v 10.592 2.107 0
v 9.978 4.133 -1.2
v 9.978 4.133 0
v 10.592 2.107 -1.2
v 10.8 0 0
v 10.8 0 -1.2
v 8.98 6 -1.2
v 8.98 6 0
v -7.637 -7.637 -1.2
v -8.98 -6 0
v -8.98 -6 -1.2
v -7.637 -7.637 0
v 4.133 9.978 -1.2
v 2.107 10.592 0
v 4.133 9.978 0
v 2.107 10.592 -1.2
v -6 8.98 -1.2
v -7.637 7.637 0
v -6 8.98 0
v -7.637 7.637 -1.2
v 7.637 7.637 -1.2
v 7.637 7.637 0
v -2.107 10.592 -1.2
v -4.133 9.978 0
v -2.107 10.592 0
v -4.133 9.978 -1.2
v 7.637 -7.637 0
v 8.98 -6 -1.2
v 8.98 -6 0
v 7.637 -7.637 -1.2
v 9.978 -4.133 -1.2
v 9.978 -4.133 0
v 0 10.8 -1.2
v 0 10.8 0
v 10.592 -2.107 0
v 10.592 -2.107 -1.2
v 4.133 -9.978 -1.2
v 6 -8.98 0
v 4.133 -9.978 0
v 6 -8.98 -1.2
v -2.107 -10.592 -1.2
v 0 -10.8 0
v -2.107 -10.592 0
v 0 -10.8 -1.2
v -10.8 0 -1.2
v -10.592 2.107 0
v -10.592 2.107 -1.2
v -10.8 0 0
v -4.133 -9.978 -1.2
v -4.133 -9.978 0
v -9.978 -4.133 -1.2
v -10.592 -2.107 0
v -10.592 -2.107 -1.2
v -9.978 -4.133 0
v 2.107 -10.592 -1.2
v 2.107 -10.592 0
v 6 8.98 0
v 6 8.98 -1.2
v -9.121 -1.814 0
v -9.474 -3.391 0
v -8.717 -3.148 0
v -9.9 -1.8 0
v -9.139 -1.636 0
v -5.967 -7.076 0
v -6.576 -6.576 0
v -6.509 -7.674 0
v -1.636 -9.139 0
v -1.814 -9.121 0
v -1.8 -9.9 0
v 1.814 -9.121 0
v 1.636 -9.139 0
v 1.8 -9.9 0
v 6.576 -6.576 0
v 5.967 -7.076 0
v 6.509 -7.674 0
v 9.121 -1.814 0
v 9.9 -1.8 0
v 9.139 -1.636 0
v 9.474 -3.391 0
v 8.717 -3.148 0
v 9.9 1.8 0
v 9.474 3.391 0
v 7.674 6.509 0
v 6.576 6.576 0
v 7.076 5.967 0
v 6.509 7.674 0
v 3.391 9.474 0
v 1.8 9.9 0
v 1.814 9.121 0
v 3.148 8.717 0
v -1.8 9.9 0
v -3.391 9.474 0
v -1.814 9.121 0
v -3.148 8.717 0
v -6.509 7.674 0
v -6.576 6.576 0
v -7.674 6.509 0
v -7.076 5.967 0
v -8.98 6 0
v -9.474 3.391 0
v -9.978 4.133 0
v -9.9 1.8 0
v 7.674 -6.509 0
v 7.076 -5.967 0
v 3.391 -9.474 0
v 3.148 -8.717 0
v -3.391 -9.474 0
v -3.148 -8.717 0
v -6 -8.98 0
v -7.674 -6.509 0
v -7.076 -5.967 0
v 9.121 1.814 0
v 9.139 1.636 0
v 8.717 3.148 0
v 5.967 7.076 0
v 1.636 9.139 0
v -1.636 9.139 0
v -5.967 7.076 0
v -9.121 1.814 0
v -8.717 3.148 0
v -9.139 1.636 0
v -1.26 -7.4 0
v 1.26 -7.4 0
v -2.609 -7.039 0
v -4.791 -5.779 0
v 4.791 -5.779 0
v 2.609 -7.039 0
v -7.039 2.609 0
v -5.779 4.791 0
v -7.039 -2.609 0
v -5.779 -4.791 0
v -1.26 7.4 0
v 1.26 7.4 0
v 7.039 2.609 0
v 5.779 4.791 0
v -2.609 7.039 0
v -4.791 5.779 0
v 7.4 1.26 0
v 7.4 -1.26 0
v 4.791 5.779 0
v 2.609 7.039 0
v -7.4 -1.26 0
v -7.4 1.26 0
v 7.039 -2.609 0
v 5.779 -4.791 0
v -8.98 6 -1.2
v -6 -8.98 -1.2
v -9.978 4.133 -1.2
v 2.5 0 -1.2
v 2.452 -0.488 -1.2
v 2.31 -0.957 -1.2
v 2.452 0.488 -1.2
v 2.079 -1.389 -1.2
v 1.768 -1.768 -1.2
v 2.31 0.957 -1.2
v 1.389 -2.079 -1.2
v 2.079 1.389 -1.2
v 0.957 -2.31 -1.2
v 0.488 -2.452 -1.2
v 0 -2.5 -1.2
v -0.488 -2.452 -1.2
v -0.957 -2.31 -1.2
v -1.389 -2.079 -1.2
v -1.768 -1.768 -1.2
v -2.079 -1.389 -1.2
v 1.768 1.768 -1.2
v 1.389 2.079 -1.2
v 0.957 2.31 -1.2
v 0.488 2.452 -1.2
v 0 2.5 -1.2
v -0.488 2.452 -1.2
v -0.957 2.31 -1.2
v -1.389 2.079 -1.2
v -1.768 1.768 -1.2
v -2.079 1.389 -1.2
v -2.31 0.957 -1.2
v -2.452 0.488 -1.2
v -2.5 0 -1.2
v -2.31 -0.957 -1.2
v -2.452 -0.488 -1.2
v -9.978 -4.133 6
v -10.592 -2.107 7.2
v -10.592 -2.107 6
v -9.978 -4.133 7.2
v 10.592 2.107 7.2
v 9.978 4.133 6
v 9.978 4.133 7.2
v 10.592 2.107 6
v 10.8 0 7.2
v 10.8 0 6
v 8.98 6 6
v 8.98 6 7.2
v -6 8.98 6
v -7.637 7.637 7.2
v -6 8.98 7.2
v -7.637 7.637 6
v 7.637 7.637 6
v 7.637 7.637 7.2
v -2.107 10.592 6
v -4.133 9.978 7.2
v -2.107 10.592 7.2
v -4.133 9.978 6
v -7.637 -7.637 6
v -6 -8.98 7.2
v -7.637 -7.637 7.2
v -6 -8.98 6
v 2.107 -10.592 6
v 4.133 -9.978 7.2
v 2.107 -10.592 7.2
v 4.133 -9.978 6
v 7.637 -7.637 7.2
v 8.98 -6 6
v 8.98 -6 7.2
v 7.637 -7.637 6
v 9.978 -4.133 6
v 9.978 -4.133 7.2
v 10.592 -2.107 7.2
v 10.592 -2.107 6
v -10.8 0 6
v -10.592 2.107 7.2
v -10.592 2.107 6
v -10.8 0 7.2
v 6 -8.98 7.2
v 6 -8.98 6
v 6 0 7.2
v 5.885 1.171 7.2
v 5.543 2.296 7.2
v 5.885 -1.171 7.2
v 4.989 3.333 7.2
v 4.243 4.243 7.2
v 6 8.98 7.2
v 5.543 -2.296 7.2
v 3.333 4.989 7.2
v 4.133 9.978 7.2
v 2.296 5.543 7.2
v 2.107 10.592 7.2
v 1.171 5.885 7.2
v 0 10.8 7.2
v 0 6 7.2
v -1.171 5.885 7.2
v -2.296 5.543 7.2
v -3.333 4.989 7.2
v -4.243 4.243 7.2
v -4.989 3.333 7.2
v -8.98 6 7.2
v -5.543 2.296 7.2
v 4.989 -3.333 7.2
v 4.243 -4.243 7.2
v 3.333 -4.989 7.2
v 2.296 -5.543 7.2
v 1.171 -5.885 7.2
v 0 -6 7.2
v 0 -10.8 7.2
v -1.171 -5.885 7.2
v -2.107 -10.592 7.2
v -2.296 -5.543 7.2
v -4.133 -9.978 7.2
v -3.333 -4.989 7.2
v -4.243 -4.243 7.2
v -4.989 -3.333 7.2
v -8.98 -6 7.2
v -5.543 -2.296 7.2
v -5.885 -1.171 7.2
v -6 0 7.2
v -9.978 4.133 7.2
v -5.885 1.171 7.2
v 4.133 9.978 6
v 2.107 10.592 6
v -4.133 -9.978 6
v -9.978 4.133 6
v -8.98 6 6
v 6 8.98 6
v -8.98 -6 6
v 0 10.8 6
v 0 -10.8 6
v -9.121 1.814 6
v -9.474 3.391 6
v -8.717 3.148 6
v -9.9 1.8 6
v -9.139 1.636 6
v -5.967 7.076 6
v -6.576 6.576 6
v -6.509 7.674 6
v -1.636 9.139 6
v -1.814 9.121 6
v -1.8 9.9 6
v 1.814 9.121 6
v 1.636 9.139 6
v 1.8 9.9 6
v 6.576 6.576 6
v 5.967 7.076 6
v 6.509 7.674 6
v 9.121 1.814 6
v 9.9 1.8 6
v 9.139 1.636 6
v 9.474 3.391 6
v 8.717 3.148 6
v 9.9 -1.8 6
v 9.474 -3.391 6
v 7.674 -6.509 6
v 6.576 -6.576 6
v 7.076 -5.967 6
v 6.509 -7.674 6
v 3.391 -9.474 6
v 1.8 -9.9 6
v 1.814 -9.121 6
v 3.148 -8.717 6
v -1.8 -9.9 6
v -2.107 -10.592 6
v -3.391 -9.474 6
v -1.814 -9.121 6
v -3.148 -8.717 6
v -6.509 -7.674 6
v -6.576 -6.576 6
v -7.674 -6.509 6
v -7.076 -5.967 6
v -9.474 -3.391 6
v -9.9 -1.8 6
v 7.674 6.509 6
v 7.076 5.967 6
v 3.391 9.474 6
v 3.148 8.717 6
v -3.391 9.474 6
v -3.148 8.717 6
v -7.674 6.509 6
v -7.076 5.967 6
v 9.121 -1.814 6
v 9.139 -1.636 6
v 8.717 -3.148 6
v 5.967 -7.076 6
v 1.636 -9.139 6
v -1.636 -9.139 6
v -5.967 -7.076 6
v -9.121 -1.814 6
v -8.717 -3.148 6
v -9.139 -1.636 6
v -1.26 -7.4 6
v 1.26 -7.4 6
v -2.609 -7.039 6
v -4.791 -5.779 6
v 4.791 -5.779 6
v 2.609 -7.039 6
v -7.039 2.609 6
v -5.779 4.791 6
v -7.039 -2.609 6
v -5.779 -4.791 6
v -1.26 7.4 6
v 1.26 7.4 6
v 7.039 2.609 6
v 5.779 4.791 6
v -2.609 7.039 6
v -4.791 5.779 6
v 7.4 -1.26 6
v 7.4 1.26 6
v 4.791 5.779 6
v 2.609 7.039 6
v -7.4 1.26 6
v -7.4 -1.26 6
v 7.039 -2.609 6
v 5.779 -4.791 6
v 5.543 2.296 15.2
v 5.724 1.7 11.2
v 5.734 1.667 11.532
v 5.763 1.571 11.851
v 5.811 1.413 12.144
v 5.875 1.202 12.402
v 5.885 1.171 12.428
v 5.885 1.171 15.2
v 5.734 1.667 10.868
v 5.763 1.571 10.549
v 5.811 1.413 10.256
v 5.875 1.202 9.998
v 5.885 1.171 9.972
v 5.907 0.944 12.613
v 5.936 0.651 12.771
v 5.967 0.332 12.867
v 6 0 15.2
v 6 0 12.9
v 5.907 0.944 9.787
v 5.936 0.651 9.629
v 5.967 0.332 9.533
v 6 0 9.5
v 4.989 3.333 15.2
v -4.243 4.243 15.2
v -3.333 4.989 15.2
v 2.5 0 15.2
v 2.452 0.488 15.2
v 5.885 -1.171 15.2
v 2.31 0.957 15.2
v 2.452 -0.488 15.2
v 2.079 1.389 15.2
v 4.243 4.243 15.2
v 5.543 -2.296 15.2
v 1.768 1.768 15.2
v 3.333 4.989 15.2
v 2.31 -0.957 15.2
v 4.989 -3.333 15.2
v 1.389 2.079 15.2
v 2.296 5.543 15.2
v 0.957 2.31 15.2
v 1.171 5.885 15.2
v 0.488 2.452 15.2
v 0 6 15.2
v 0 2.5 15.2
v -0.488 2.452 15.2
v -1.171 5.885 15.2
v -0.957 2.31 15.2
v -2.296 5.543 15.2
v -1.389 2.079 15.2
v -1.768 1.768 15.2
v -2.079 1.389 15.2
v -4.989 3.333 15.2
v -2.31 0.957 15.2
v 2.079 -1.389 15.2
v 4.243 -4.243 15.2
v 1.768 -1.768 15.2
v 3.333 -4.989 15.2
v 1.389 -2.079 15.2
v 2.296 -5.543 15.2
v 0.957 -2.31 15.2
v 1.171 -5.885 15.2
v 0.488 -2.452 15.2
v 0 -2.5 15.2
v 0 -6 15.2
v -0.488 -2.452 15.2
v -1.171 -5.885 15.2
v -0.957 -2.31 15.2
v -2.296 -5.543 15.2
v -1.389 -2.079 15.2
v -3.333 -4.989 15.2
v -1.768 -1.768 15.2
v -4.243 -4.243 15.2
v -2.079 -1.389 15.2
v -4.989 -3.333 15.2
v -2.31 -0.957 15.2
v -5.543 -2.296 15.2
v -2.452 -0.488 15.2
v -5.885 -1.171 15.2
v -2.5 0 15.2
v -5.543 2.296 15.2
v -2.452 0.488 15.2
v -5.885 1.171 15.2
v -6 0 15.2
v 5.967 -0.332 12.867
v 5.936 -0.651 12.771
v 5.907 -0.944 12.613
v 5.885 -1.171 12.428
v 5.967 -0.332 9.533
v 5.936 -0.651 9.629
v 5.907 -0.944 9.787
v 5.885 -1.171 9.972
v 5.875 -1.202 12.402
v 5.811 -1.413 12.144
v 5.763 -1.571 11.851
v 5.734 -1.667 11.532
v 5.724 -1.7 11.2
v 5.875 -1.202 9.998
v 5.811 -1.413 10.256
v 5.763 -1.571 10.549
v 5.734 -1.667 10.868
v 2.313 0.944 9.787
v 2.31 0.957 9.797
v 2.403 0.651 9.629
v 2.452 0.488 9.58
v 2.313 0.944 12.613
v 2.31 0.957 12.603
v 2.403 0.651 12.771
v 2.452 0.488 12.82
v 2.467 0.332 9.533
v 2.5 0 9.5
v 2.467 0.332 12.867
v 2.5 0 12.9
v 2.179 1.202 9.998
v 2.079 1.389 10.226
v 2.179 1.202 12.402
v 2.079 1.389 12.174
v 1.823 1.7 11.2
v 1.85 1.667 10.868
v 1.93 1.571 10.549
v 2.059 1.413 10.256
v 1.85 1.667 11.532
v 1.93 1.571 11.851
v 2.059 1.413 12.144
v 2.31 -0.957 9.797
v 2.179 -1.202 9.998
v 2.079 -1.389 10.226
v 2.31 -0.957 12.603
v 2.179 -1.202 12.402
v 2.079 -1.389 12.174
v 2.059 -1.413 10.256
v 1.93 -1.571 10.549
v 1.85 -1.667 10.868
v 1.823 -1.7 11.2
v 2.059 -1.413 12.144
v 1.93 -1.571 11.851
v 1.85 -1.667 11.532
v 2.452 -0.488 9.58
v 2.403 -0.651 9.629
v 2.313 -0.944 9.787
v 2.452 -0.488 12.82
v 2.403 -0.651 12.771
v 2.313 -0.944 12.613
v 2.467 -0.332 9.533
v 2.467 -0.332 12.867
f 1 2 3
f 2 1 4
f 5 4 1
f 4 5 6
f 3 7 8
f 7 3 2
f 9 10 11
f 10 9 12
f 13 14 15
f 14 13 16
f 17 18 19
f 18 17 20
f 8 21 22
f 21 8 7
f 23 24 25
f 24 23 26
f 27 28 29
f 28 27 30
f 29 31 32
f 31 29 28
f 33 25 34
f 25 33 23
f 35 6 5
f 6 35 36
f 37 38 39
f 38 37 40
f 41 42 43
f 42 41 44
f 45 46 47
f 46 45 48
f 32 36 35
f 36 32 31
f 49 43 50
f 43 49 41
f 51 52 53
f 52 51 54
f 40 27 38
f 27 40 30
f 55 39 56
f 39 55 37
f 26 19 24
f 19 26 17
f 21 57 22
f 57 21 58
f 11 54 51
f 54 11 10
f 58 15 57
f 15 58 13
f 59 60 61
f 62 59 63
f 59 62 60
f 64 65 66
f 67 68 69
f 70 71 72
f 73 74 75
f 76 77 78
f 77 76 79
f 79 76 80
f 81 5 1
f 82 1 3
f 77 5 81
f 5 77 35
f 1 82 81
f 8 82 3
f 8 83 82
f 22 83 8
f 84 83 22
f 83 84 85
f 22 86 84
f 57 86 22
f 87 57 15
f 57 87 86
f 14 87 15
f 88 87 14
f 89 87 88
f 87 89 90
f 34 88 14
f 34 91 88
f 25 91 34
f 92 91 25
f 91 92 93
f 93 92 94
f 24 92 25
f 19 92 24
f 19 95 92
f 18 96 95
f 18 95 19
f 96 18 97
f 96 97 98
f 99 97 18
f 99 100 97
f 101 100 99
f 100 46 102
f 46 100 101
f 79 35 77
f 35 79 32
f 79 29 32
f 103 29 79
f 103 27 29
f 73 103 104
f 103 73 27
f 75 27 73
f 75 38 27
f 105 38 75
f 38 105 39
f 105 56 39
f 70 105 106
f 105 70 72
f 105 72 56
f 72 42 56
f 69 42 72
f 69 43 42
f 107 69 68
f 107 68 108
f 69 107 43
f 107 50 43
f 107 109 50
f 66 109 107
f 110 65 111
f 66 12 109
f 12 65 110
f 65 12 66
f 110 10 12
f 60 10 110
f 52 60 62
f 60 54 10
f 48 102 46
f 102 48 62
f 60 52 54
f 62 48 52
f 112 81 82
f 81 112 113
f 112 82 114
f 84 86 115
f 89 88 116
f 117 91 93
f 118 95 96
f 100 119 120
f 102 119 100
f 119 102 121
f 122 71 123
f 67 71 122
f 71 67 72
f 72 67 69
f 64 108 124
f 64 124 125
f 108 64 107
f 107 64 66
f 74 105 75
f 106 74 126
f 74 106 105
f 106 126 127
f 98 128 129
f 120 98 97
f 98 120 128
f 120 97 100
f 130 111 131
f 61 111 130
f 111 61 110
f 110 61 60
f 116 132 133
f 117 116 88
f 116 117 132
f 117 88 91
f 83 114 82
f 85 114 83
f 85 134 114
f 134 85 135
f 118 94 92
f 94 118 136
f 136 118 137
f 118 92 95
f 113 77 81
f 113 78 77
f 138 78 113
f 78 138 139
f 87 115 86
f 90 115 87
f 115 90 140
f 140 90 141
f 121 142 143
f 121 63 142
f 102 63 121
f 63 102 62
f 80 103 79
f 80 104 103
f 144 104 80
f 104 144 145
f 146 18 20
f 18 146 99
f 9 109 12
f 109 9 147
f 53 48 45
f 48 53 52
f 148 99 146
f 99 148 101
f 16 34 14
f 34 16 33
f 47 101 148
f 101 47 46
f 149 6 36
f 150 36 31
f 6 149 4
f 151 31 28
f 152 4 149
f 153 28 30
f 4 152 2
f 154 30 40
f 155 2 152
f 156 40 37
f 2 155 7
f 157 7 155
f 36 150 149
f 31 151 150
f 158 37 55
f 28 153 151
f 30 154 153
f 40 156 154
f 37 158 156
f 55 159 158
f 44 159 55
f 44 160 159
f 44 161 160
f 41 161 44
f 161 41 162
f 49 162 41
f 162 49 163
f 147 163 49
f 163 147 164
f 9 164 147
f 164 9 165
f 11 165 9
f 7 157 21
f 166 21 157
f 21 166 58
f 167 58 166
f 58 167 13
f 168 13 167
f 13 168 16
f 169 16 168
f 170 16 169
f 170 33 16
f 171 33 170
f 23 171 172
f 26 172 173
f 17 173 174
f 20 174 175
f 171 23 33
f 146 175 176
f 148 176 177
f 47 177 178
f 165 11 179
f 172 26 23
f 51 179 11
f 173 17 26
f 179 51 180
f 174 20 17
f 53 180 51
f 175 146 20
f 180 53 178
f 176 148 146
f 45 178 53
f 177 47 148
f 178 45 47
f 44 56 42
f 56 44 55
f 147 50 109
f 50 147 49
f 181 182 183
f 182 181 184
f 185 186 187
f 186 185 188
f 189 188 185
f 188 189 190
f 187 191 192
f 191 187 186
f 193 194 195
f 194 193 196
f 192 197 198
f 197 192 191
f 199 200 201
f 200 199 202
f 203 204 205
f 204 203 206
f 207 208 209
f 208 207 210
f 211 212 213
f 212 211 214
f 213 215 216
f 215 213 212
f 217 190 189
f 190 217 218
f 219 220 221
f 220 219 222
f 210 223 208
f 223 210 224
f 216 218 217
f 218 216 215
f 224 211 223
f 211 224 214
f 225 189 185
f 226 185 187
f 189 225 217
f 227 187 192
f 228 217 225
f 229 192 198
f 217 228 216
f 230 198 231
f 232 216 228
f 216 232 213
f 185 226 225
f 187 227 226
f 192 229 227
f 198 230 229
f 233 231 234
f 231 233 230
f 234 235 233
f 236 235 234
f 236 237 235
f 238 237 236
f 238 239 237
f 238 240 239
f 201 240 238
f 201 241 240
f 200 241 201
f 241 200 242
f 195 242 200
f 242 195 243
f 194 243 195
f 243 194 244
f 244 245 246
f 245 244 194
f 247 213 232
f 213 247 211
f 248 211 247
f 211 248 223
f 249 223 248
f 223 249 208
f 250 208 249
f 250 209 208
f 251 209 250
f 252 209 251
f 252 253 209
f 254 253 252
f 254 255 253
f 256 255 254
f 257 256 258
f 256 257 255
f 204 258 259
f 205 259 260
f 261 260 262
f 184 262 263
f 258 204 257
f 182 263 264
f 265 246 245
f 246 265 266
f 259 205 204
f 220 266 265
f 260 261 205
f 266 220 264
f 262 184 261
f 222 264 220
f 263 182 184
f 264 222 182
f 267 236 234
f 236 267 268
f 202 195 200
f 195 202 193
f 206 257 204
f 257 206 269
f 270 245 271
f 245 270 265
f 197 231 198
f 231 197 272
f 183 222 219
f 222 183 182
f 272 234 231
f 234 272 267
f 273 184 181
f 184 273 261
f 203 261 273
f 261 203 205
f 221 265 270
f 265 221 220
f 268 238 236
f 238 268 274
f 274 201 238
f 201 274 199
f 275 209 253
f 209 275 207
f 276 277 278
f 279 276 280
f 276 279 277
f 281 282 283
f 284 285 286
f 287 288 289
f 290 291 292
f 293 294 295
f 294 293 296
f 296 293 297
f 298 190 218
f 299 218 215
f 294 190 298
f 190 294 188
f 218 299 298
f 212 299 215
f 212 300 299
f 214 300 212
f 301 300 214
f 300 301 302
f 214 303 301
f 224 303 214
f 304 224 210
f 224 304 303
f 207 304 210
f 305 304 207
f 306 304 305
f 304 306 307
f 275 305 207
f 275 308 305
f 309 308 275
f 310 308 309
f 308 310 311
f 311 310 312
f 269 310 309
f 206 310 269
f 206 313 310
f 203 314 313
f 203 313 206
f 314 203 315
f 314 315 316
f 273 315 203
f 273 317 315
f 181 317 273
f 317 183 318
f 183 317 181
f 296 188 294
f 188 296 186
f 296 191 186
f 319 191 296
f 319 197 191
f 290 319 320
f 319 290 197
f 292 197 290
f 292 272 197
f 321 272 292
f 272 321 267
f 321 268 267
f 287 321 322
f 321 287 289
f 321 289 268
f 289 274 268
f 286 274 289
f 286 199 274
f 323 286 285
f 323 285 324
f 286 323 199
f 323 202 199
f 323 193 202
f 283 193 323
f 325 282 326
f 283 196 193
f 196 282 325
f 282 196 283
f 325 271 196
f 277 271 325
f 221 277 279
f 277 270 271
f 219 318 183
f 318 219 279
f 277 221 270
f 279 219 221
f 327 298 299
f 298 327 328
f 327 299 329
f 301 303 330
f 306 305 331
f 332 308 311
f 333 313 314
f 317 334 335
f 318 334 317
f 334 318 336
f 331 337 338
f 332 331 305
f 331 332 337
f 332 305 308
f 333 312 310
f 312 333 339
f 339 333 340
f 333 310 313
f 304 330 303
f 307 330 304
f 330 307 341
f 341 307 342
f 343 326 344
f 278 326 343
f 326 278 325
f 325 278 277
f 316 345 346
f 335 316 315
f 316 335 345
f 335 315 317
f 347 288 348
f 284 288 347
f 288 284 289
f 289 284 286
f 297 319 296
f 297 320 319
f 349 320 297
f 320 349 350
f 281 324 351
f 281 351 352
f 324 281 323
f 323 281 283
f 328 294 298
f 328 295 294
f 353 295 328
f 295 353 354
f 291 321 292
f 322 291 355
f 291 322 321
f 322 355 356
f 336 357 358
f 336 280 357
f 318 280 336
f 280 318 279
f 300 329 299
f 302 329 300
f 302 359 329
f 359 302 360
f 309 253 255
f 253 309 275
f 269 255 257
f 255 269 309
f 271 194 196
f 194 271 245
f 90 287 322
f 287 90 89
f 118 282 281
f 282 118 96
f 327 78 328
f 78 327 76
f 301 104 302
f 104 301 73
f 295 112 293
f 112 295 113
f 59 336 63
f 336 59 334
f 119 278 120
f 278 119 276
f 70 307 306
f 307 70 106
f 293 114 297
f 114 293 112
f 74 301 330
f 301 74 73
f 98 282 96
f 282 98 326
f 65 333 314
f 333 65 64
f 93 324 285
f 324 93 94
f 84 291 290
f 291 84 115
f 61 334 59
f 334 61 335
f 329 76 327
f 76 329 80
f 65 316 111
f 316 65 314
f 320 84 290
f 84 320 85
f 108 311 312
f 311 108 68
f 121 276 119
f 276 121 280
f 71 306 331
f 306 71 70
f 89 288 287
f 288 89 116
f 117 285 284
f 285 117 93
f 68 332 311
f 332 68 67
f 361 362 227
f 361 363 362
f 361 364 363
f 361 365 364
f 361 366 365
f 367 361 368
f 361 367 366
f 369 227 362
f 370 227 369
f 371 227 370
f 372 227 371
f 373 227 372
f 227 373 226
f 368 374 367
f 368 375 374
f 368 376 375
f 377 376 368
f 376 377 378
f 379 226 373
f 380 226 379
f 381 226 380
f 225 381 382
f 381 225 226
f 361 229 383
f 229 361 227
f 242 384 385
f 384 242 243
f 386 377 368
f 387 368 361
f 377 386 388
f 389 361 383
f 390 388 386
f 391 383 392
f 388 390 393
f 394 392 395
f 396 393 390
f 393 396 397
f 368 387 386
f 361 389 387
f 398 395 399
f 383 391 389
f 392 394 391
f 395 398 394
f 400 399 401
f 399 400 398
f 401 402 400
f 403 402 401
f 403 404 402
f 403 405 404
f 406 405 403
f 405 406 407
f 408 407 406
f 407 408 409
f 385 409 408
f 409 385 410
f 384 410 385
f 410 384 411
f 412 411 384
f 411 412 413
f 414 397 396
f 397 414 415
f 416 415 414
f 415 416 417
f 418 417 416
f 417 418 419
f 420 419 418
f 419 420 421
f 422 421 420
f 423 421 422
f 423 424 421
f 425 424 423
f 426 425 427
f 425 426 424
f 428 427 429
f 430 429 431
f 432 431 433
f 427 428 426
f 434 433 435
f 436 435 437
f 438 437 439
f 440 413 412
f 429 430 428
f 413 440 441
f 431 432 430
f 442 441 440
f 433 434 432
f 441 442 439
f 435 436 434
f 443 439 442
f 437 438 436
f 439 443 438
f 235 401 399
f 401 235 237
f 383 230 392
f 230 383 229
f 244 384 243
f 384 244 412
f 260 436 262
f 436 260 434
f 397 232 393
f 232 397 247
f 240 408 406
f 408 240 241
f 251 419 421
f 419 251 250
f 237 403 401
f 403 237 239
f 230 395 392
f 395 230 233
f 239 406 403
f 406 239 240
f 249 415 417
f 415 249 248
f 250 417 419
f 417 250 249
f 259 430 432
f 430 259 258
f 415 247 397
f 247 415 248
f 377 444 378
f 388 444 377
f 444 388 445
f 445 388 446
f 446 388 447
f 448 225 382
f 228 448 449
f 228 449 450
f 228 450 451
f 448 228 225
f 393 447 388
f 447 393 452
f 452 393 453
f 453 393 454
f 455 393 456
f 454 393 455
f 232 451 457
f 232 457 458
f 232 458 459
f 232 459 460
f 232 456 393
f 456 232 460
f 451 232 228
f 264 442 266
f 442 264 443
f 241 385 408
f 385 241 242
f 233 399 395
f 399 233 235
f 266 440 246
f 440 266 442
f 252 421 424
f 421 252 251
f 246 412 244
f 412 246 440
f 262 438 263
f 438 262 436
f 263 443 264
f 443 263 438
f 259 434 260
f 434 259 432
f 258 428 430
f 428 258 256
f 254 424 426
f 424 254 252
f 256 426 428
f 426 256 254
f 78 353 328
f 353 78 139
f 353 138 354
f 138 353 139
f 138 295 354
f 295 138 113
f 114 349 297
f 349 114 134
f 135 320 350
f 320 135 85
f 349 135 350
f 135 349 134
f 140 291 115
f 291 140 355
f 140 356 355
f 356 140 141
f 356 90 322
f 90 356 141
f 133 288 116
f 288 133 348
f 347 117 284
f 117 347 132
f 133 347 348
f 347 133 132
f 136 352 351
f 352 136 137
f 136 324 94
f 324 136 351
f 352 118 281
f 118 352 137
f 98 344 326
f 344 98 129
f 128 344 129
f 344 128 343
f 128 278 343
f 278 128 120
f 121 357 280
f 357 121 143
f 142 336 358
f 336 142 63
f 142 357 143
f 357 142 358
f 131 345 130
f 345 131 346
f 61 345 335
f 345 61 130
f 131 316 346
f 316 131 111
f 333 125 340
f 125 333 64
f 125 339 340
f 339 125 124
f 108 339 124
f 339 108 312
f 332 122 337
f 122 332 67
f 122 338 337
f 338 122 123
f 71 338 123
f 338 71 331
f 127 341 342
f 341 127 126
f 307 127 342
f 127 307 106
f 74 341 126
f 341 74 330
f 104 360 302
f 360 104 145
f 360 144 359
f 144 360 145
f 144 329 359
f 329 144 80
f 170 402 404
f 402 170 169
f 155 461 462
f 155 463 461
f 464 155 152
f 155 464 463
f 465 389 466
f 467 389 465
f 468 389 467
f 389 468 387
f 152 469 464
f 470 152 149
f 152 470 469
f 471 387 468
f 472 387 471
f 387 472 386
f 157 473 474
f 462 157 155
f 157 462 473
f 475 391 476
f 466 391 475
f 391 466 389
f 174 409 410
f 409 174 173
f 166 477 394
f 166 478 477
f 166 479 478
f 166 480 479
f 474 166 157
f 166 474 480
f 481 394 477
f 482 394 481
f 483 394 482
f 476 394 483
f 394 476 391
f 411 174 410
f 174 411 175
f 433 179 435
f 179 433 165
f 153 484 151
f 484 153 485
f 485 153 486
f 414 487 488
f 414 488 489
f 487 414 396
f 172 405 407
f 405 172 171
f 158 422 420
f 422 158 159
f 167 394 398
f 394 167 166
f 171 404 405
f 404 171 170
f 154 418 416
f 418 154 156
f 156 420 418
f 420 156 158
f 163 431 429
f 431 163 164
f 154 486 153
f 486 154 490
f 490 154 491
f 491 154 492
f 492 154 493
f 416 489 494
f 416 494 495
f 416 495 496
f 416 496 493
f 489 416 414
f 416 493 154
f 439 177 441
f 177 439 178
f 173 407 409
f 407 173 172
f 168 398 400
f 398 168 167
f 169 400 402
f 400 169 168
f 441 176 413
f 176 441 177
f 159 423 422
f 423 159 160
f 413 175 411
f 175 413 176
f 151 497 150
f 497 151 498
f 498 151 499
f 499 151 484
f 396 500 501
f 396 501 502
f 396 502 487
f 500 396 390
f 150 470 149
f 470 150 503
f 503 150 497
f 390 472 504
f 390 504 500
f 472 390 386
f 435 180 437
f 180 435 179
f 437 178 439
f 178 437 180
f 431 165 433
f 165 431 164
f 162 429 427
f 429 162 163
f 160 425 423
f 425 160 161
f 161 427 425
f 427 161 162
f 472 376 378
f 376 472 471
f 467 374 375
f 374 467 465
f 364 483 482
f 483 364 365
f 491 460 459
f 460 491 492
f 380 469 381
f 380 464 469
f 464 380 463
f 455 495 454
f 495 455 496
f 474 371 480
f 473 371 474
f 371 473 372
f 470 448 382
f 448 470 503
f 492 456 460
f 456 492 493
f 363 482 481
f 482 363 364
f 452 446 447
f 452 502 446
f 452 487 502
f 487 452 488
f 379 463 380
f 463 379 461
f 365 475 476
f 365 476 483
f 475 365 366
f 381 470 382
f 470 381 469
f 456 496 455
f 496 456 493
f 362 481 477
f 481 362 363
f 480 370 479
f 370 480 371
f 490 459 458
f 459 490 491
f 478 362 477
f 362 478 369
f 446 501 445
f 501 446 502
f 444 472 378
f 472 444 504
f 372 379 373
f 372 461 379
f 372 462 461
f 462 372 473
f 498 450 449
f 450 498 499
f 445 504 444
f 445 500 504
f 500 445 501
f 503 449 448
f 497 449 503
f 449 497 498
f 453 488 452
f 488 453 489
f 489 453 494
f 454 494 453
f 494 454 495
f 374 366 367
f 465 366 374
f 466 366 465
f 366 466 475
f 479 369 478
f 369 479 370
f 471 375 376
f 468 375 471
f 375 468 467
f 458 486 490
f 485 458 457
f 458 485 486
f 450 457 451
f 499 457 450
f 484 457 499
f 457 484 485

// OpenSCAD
$fn = 32;

// ----------------------------------------------------------------------
// Timing pulley: T5 12T, pitch 5 mm, 21.6 mm x 16.4 mm
// ----------------------------------------------------------------------

// --- parameters (mm) ---
belt_pitch = 5;           // belt pitch
n_teeth = 12;             // number of grooves
rim_w = 6;                // belt width between the flanges
tip_d = 18.6;             // tip circle diameter
root_d = 16;              // groove bottom diameter
groove_h = 1.3;           // groove depth
tooth_w = 3;              // groove width at the tip circle
rim_d = 21.6;             // flange diameter
rim_t = 1.2;              // flange thickness
spigot_d = 14.4;          // flange spigot, sunk into the rim
spigot_h = 1.2;           // spigot depth into the rim
shaft_d = 5;              // shaft bore
hub_d = 12;               // hub diameter
hub_h = 8;                // hub above the flange
bottom_z = -1.2;          // lowest point of the pulley
top_z = 15.2;             // highest point of the pulley
set_d = 3.4;              // set screw tap hole

module rim() {
  cylinder(h = rim_w, d = tip_d);
}

module groove_cutter() {
  /* belt tooth groove: deeper than wide, cut through the belt width */
  translate([root_d / 2, 0, 0])
    linear_extrude(height = rim_w)
      polygon(points = [[-0.6, -tooth_w * 0.42], [groove_h + 0.6, -tooth_w * 0.6],
                        [groove_h + 0.6, tooth_w * 0.6], [-0.6, tooth_w * 0.42]]);
}

module flanges() {
  translate([0, 0, -rim_t]) cylinder(h = rim_t, d = rim_d);
  translate([0, 0, rim_w]) cylinder(h = rim_t, d = rim_d);
  translate([0, 0, -spigot_h]) cylinder(h = spigot_h + 0.6, d = spigot_d);
  translate([0, 0, rim_w - 0.6]) cylinder(h = spigot_h + 0.6, d = spigot_d);
}

module hub() {
  translate([0, 0, bottom_z]) cylinder(h = top_z - bottom_z, d = hub_d);
}

difference() {
  union() {
    rim();
    hub();
    flanges();
  }
  for (i = [0 : n_teeth - 1]) rotate([0, 0, i * 360 / n_teeth]) groove_cutter();
  translate([0, 0, bottom_z - 1]) cylinder(h = top_z - bottom_z + 2, d = shaft_d);
  translate([-1, 0, top_z - hub_h * 0.5]) rotate([0, 90, 0]) cylinder(h = hub_d / 2 + 3, d = set_d);
}
